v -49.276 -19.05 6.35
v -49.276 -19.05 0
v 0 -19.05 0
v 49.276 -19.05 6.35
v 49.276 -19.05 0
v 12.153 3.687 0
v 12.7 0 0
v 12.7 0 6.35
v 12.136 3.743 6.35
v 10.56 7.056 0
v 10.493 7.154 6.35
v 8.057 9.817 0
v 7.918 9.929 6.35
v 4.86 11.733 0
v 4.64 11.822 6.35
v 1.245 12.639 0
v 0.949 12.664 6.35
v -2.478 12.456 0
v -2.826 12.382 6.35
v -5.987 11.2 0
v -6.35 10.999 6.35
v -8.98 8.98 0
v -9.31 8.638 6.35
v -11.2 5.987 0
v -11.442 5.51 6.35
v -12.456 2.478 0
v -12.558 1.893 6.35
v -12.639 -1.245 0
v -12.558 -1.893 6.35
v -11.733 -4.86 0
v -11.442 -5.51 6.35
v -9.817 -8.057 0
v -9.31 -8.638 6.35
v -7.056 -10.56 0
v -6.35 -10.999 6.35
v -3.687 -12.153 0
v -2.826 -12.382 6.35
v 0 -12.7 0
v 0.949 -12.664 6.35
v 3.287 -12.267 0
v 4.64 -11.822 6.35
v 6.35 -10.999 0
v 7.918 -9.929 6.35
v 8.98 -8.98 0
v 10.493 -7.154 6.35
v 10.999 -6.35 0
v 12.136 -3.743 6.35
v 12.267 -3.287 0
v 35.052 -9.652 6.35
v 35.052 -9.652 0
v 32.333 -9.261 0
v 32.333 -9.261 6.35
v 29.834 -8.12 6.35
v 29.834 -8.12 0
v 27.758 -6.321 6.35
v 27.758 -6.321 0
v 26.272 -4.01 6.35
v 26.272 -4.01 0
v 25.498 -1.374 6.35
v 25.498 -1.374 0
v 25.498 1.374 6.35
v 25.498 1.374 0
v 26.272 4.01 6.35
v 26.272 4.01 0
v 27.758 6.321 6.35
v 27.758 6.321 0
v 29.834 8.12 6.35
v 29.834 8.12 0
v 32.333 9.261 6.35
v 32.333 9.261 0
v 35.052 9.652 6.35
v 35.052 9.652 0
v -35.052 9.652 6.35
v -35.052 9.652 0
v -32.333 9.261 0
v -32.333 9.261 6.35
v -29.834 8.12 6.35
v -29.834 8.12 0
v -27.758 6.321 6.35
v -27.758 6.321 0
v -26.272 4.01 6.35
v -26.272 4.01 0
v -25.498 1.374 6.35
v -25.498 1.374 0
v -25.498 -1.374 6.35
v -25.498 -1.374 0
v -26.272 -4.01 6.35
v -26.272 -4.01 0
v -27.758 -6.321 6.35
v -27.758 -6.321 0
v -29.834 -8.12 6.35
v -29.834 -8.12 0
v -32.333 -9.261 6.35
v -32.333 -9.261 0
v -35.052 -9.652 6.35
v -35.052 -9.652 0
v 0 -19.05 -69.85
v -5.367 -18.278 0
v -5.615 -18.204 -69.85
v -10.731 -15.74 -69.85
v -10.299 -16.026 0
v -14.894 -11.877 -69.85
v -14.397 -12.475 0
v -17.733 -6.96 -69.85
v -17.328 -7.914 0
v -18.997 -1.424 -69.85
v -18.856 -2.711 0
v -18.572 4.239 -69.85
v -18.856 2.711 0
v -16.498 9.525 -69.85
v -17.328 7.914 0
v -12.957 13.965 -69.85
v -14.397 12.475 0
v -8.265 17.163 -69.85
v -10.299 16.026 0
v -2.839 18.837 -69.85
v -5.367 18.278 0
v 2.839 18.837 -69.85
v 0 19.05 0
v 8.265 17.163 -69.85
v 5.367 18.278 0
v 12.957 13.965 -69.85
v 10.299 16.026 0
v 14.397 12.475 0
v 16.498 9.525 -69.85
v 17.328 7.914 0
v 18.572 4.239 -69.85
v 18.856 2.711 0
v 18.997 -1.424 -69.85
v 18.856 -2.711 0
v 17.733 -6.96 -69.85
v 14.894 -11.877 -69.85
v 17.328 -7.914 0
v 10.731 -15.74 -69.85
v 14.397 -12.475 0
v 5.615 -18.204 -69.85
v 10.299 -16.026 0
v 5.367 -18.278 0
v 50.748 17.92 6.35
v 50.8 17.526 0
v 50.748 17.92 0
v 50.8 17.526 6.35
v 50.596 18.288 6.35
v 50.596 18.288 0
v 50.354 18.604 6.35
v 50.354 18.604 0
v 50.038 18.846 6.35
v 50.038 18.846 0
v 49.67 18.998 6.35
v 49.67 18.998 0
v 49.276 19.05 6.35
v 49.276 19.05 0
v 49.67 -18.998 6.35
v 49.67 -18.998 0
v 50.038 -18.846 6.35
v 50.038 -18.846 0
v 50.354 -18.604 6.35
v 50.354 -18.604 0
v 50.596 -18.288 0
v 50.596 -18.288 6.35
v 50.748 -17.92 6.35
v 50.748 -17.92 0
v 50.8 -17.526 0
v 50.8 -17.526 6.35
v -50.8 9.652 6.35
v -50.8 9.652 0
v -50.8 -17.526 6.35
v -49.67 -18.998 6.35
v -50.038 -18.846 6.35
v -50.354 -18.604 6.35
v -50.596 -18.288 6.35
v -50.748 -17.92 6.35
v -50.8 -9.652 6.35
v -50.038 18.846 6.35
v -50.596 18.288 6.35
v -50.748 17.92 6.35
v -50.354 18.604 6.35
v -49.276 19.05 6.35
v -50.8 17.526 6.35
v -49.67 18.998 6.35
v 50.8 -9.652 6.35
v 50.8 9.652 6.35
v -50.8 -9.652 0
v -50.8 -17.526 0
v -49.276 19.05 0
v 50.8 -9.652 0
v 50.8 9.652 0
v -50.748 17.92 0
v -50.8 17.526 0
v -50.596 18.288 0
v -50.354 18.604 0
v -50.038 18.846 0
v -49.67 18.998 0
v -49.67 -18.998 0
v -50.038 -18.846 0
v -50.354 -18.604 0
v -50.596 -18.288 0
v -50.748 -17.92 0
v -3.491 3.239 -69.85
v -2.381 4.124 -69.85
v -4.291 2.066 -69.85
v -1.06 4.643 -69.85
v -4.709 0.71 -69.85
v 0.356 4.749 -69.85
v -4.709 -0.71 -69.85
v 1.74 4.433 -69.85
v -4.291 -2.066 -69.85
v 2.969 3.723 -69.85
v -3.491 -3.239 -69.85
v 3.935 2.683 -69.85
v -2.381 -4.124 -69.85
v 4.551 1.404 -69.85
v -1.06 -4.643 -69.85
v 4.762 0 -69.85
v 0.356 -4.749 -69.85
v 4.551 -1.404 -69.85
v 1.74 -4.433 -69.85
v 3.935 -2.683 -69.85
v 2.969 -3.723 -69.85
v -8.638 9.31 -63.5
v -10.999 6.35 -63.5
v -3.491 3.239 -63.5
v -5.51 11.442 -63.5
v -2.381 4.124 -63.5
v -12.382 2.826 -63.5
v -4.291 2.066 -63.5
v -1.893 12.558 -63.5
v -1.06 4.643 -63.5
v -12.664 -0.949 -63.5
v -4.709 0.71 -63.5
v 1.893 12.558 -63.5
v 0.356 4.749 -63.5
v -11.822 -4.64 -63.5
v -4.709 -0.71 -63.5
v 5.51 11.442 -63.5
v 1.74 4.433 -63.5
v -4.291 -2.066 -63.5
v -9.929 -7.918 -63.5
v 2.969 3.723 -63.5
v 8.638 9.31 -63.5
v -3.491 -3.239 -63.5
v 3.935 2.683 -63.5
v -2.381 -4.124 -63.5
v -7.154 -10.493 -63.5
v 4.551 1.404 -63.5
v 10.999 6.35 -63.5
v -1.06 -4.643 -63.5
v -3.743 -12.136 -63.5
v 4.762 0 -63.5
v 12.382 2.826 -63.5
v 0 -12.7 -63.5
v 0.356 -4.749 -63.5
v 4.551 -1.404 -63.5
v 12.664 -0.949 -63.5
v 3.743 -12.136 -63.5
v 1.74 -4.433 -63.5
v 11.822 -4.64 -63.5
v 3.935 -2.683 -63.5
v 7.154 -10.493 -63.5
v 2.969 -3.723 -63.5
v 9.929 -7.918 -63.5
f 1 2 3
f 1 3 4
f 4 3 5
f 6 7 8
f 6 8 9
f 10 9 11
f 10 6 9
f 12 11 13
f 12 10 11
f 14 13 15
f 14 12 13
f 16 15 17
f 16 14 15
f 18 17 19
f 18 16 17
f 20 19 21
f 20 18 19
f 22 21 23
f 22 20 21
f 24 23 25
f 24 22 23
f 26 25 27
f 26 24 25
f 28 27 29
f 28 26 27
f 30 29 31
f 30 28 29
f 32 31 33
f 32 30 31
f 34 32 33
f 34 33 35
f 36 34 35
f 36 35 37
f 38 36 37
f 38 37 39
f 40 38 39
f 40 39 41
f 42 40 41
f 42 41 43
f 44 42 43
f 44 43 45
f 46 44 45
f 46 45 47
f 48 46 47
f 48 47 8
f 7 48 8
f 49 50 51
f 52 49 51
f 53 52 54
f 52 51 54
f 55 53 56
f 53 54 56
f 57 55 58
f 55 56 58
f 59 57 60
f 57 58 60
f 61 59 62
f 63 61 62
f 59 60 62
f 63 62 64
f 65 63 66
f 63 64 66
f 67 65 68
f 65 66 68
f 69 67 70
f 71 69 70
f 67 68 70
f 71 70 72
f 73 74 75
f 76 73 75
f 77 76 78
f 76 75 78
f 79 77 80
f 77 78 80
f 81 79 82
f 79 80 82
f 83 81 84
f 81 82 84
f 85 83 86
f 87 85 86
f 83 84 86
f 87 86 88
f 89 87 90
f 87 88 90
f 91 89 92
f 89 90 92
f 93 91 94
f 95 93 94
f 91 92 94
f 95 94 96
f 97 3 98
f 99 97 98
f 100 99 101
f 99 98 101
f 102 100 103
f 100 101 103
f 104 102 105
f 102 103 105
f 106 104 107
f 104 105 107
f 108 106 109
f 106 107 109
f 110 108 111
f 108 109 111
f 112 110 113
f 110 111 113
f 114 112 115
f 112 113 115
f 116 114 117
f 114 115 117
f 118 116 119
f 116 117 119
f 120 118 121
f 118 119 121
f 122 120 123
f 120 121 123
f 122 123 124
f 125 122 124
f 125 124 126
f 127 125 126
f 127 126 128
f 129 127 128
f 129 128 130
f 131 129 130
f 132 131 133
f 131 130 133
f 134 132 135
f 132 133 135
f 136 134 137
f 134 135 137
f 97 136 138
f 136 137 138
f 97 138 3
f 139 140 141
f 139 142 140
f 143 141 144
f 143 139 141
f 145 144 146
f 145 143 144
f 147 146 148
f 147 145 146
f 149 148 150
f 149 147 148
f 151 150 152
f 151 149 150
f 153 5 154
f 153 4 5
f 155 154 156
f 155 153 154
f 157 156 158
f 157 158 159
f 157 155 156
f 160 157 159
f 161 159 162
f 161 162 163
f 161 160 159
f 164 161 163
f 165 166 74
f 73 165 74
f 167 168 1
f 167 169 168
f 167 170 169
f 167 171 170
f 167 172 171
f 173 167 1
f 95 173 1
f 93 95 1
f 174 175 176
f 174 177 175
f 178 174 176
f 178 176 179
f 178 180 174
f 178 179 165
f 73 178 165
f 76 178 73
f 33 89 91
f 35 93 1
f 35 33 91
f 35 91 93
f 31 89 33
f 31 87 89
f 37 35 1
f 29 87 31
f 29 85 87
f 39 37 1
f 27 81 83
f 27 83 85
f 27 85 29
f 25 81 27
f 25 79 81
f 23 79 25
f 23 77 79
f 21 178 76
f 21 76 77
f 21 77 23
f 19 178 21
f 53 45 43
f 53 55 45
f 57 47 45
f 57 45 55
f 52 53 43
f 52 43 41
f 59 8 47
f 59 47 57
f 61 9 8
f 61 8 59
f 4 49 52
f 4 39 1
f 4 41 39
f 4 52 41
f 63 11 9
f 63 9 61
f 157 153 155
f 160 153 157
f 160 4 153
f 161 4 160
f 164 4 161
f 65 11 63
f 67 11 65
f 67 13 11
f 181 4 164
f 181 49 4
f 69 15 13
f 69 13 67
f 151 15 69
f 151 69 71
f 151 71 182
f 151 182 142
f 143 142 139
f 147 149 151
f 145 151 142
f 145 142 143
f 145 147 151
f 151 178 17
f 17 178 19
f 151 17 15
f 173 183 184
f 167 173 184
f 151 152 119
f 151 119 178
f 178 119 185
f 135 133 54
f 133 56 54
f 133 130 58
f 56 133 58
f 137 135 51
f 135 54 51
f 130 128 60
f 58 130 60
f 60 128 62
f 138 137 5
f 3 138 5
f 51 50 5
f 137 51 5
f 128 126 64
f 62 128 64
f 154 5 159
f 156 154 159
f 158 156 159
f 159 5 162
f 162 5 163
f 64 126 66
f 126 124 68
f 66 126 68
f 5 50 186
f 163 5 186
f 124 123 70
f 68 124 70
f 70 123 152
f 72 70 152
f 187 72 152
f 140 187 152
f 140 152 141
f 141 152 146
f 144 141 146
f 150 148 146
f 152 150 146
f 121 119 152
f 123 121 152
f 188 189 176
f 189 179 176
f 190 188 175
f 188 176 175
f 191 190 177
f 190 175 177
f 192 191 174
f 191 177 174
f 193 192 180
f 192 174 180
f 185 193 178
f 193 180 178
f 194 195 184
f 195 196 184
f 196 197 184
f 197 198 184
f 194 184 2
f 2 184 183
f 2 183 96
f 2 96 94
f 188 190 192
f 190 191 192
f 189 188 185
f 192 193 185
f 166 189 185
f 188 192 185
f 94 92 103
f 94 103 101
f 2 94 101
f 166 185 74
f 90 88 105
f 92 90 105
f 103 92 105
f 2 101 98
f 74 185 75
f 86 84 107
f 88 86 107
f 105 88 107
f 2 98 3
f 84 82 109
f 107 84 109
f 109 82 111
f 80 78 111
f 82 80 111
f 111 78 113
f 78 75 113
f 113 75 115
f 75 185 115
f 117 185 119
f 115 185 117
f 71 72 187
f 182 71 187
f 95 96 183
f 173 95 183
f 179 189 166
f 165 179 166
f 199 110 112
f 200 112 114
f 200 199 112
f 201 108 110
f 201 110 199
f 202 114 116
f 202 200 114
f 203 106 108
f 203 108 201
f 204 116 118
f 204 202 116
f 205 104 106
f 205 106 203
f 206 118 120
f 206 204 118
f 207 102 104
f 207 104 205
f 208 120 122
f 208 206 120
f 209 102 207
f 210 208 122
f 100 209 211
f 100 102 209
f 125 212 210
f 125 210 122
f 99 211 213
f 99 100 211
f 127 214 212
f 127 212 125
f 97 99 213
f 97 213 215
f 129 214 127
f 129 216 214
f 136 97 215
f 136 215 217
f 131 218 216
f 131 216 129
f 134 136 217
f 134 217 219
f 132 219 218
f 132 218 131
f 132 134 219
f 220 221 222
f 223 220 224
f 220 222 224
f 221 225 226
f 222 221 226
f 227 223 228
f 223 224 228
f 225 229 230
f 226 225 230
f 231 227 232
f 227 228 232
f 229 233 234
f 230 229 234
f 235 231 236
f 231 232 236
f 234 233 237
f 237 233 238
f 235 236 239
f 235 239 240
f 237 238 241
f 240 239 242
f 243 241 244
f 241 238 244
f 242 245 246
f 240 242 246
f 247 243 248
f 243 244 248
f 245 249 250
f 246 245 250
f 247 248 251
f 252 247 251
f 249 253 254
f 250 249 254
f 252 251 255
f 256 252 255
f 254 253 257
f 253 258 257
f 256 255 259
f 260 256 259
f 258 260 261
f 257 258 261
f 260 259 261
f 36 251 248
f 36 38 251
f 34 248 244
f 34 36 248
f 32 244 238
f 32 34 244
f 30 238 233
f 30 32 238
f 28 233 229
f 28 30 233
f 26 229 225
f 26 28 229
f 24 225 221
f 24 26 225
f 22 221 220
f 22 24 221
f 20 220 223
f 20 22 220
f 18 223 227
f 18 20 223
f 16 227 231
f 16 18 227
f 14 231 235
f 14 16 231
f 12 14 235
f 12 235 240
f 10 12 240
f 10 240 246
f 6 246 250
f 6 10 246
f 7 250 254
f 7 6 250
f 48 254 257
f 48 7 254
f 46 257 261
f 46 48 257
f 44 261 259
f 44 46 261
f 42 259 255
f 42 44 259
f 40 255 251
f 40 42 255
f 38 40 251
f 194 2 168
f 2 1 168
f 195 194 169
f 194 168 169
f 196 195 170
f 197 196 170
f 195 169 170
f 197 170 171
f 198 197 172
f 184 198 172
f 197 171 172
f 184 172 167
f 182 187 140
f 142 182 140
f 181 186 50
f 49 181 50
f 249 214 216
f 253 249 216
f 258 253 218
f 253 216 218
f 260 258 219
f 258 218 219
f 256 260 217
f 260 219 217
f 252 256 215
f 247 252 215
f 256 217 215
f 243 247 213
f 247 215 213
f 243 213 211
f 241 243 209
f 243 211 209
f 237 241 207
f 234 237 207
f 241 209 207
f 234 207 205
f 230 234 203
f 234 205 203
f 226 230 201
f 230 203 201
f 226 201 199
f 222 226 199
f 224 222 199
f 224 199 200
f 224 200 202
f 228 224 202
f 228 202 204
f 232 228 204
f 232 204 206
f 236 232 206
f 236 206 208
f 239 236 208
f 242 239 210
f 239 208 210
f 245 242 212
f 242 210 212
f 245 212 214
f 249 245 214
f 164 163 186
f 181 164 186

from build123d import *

# Parameters (mm, degrees)
F0_R     = 12.7
F1_DEPTH = 6.35
F2_R     = 1.524
F3_W     = 6.35
F3_H     = 69.85
F5_R     = 12.7
F5_R_2   = 4.7625
F6_DEPTH = 6.35


with BuildPart() as f1:
    # F0 (on Top) → F1 (new body)
    with BuildSketch(Plane.XY):
        with BuildLine():
            Line((-50.8, -19.05), (50.8, -19.05))
            Line((50.8, -19.05), (50.8, -9.652))
            Line((50.8, -9.652), (35.052, -9.652))
            ThreePointArc((35.052, -9.652), (25.4, 0), (35.052, 9.652))
            Line((35.052, 9.652), (50.8, 9.652))
            Line((50.8, 9.652), (50.8, 19.05))
            Line((50.8, 19.05), (-50.8, 19.05))
            Line((-50.8, 19.05), (-50.8, 9.652))
            Line((-50.8, 9.652), (-35.052, 9.652))
            ThreePointArc((-35.052, 9.652), (-25.4, 0), (-35.052, -9.652))
            Line((-35.052, -9.652), (-50.8, -9.652))
            Line((-50.8, -9.652), (-50.8, -19.05))
        make_face()
        Circle(F0_R, mode=Mode.SUBTRACT)
    extrude(amount=F1_DEPTH)

    # F2
    f2_edges = [f1.edges().sort_by_distance(p)[0] for p in [
        (-50.8, 19.05, 3.175),
        (50.8, 19.05, 3.175),
        (50.8, -19.05, 3.175),
        (-50.8, -19.05, 3.175),
    ]]
    fillet(f2_edges, radius=F2_R)

    # F3 (on Right) → F4 (revolve)
    with BuildSketch(Plane.YZ):
        with Locations((-15.875, -34.925)):
            Rectangle(F3_W, F3_H)
    revolve(axis=Axis((0, 0, -16.966719), (0, 0, -1)))

    # F5 (on face) → F6 (join)
    with BuildSketch(Plane(origin=(0, 0, -69.85), x_dir=(1, 0, 0), z_dir=(0, 0, -1))):
        Circle(F5_R)
        Circle(F5_R_2, mode=Mode.SUBTRACT)
    extrude(amount=-F6_DEPTH)


solid = f1.part
